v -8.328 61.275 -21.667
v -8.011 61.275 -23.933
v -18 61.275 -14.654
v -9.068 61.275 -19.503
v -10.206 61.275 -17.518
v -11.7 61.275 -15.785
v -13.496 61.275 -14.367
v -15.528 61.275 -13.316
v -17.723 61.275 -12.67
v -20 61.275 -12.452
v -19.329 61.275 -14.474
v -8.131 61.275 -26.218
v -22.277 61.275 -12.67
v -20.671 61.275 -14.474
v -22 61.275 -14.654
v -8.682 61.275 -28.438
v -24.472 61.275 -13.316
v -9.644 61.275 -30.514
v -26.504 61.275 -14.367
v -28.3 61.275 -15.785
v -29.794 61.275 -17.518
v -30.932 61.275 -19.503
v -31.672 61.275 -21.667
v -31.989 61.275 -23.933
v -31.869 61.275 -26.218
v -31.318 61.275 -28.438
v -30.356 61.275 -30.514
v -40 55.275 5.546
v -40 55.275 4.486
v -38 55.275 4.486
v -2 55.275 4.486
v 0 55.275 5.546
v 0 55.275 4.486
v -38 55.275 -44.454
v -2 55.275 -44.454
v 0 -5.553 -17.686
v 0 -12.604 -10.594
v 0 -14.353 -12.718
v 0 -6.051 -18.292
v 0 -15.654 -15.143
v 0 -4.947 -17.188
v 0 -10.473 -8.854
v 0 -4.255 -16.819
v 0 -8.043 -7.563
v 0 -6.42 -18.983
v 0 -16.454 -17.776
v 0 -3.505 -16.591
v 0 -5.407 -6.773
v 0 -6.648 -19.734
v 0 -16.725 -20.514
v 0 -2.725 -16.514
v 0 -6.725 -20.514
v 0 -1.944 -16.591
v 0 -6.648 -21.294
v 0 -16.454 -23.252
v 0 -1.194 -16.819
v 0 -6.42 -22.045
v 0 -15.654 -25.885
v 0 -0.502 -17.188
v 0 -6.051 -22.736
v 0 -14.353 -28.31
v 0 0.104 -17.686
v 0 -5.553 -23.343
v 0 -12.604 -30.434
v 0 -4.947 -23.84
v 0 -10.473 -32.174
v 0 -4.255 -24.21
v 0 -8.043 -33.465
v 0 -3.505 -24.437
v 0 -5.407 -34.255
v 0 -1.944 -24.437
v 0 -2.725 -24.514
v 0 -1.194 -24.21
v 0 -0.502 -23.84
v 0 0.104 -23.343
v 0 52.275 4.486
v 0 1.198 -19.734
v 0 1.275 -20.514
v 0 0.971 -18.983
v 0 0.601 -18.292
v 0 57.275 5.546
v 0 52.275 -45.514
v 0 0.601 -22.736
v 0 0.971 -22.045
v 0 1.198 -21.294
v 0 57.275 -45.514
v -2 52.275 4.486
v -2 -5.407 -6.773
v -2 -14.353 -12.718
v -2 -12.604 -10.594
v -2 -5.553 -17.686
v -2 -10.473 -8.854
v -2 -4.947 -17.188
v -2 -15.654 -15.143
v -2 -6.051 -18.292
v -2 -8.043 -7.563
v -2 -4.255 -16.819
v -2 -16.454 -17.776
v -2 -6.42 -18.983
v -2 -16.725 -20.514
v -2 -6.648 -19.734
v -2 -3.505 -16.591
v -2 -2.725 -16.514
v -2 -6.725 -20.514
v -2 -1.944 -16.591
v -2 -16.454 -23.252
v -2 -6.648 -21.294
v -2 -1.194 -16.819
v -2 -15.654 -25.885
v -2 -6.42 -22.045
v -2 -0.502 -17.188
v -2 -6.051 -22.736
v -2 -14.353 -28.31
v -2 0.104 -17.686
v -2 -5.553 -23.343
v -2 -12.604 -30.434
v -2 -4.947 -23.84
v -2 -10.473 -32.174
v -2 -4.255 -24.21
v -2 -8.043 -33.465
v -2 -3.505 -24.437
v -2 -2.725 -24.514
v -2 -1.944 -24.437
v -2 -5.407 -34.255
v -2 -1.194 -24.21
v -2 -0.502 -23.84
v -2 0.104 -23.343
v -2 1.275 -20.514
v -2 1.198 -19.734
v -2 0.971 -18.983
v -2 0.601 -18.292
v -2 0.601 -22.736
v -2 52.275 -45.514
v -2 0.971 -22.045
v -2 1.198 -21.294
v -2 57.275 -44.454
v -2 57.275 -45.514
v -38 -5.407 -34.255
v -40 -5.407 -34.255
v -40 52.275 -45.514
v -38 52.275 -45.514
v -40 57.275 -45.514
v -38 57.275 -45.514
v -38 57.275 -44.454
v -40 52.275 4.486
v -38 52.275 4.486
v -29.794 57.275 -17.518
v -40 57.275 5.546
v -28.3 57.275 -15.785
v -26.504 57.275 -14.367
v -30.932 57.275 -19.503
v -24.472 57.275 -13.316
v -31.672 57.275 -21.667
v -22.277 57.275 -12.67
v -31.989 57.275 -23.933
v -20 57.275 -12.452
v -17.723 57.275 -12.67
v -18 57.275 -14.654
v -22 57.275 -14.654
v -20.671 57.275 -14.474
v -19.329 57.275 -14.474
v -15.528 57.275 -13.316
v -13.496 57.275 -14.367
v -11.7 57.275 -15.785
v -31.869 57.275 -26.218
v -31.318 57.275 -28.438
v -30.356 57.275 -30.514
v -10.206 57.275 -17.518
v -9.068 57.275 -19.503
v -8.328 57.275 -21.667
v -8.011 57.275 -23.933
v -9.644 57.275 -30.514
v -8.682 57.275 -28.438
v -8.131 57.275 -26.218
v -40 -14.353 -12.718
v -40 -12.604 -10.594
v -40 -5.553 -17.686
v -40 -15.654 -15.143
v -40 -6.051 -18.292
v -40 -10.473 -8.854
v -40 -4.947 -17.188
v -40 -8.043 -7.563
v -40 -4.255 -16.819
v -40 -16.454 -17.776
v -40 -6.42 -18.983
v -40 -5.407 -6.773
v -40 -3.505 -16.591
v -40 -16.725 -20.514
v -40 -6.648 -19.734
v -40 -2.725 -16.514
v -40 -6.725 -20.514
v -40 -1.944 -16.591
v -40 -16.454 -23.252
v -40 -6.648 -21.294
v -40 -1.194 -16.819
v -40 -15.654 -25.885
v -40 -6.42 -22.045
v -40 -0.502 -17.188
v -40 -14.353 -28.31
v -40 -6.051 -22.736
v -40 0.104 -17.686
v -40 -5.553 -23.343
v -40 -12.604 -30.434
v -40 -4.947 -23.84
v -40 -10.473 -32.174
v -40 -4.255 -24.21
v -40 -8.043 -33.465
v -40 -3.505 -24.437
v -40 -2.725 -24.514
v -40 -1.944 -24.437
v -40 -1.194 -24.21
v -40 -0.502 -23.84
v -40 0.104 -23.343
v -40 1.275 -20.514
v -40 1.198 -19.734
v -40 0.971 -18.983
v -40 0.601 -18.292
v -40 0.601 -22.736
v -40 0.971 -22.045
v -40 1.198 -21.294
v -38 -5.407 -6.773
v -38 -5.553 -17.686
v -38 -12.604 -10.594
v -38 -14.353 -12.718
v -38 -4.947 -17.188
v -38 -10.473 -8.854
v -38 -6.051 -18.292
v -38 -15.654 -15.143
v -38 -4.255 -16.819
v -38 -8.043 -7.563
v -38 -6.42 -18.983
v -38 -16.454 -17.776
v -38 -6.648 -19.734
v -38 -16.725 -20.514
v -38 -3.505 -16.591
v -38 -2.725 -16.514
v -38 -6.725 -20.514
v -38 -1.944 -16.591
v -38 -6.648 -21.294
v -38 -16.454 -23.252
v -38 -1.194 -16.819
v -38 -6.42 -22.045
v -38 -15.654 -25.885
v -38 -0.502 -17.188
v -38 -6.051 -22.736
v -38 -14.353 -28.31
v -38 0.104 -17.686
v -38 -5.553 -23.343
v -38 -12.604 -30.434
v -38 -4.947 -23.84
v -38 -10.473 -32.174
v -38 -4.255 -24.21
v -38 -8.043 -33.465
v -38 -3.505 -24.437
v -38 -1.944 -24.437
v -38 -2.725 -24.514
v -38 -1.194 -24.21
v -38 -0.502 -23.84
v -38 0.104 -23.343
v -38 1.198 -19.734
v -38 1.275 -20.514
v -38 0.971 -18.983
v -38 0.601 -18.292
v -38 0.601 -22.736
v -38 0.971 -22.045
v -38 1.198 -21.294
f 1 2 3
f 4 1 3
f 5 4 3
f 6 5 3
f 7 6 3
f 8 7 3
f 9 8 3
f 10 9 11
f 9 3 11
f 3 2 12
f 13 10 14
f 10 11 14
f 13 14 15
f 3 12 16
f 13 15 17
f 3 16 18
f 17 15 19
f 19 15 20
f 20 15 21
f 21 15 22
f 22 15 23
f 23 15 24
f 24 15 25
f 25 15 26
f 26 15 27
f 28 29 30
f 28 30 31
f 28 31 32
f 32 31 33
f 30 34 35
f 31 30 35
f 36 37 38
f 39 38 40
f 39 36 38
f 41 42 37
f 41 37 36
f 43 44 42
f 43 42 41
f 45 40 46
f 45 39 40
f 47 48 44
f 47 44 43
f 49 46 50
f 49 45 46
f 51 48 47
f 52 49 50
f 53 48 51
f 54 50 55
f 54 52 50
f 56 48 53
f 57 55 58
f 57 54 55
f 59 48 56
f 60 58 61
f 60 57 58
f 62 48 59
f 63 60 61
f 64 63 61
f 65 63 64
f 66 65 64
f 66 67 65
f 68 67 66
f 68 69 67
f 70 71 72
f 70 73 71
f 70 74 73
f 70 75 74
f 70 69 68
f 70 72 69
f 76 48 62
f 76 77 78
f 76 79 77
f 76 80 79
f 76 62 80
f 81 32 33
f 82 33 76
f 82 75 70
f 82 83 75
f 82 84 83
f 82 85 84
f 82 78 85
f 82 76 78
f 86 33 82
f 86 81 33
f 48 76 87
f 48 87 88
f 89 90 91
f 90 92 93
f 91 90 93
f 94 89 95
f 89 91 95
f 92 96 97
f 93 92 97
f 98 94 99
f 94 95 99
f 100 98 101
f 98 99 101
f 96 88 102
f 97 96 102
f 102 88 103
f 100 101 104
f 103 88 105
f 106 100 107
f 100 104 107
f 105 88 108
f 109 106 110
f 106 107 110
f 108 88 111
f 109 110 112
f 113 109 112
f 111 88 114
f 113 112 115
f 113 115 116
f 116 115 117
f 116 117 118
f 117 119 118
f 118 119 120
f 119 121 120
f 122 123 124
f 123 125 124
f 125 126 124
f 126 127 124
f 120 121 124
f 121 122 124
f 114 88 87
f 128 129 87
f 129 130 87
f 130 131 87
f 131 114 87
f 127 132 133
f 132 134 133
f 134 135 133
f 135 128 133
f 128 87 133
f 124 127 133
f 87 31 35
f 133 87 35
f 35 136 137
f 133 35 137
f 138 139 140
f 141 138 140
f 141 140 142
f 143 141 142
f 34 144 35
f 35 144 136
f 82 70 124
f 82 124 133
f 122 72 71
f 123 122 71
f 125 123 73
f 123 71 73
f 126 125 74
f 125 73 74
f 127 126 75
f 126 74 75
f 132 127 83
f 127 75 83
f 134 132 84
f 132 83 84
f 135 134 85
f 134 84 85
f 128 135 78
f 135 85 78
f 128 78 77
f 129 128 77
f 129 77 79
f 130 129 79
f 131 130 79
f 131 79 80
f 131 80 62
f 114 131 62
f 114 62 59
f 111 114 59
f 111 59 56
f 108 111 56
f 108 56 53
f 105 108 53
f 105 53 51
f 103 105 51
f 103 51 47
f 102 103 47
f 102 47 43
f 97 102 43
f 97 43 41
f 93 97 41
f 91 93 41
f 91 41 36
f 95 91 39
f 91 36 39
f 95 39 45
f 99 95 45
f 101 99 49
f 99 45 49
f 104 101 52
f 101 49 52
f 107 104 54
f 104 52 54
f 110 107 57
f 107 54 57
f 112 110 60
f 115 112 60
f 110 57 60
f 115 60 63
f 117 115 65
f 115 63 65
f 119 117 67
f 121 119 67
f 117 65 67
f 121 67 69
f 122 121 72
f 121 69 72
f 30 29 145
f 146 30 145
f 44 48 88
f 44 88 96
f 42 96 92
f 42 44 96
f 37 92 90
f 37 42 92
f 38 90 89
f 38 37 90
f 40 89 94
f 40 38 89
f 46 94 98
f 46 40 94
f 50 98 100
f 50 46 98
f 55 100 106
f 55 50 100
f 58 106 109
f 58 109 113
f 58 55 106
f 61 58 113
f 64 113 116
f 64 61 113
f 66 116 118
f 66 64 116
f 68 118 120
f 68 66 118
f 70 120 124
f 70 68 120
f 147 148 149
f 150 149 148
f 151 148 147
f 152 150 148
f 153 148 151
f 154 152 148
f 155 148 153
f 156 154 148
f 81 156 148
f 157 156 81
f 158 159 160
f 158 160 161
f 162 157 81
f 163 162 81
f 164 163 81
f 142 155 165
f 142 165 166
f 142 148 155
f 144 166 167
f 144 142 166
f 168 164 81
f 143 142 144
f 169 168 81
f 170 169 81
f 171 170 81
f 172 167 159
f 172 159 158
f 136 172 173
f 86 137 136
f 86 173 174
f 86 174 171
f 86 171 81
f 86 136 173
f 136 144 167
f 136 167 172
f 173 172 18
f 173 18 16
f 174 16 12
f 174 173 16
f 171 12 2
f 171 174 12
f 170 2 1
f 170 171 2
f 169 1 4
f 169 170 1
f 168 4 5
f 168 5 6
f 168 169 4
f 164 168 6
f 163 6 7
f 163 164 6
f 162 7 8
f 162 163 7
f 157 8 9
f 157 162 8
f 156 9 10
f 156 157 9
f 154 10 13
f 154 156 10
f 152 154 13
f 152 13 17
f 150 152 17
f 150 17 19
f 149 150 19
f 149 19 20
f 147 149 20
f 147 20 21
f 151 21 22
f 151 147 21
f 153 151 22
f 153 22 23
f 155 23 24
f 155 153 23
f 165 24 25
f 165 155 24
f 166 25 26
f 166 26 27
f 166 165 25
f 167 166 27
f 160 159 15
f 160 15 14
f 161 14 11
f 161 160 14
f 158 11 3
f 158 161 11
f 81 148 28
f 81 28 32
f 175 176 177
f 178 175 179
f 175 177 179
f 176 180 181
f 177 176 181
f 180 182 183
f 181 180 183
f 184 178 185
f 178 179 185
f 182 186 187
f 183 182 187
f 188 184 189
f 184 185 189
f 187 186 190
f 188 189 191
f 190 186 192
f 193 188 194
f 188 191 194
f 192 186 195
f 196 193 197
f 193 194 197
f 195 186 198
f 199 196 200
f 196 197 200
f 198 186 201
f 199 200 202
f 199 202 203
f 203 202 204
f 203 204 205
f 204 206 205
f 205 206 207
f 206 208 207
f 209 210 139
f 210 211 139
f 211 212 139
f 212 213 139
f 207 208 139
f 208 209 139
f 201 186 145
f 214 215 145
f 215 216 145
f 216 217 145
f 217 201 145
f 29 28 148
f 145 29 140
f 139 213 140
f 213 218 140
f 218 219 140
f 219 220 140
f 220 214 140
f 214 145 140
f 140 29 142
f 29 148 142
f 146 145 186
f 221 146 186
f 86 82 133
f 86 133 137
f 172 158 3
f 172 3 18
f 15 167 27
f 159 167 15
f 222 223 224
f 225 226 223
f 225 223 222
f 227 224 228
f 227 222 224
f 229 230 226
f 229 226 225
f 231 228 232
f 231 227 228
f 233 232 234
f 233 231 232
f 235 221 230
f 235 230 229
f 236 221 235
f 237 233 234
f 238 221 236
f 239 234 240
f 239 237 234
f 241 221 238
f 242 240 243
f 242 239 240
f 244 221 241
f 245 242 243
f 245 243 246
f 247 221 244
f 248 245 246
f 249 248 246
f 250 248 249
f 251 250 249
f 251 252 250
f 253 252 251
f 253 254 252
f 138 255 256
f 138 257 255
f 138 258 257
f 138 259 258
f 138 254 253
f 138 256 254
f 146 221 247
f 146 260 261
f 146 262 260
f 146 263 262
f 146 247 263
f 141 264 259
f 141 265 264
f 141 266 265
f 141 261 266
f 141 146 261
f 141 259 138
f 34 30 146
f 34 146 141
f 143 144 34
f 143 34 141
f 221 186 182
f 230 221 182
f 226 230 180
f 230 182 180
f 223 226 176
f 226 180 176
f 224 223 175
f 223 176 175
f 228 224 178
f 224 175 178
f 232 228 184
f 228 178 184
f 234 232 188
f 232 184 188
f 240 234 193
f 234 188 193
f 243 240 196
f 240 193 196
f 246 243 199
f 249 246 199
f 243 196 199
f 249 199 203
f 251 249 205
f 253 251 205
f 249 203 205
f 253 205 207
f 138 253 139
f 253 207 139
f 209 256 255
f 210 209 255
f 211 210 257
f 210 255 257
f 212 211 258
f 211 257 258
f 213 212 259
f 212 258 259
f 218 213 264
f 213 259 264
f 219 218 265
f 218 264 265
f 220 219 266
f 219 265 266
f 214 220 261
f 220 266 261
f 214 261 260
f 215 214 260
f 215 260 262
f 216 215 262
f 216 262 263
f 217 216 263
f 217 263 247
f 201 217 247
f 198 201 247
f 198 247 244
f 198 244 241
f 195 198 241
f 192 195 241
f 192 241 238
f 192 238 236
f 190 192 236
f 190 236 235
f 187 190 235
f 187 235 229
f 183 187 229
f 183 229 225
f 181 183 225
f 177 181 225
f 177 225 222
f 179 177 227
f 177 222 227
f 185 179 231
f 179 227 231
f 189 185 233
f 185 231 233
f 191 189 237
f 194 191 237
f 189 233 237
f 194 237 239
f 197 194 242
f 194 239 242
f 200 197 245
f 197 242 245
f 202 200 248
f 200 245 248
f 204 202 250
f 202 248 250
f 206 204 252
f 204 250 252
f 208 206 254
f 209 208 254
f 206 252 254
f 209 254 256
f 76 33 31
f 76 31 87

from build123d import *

# Parameters (mm, degrees)
BOSS_EXTRUDE1_DEPTH = 2
SKETCH2_W           = 40
SKETCH2_H           = 50
BOSS_EXTRUDE2_DEPTH = 2
BOSS_EXTRUDE3_DEPTH = 4
SKETCH4_R           = 4
CUT_EXTRUDE1_DEPTH  = 41


with BuildPart() as part:
    # Sketch1 → Boss-Extrude1 (new body)
    with BuildSketch(Plane(origin=(0, 0, 0), x_dir=(0, 0, -1), z_dir=(1, 0, 0))):
        with BuildLine():
            Line((-4.485924614, 52.27530577), (6.773398514, -5.406820081))
            ThreePointArc((6.773398514, -5.406820081), (20.514075386, -16.72469423), (34.254752259, -5.406820081))
            Line((34.254752259, -5.406820081), (45.514075386, 52.27530577))
            Line((45.514075386, 52.27530577), (45.514075386, 57.27530577))
            Line((45.514075386, 57.27530577), (-4.485924614, 57.27530577))
            Line((-4.485924614, 57.27530577), (-4.485924614, 52.27530577))
        make_face()
    extrude(amount=-BOSS_EXTRUDE1_DEPTH)


with BuildPart() as body_2:
    # Mirror1: mirrored copy
    add(part.part.mirror(Plane(origin=(-20, 0, 0), x_dir=(0, 0, 1), z_dir=(1, 0, 0))))


with BuildPart() as part_1:
    add(part.part)

    add(body_2.part)  # Boss-Extrude2 merges body 2
    # Sketch2 → Boss-Extrude2 (add)
    with BuildSketch(Plane(origin=(0, 57.27530577, 0), x_dir=(1, 0, 0), z_dir=(0, 1, 0))):
        with Locations((-20, 19.454333817)):
            Rectangle(SKETCH2_W, SKETCH2_H)
    extrude(amount=-BOSS_EXTRUDE2_DEPTH)

    # Sketch3 → Boss-Extrude3 (add)
    with BuildSketch(Plane(origin=(0, 57.27530577, 0), x_dir=(1, 0, 0), z_dir=(0, 1, 0))):
        with BuildLine():
            Line((-18, 14.653938589), (-9.643842411, 30.514075386))
            ThreePointArc((-9.643842411, 30.514075386), (-20, 12.45189756), (-30.356157589, 30.514075386))
            Line((-30.356157589, 30.514075386), (-22, 14.653938589))
            ThreePointArc((-22, 14.653938589), (-20, 14.45189756), (-18, 14.653938589))
        make_face()
    extrude(amount=BOSS_EXTRUDE3_DEPTH)

    # Sketch4 → Cut-Extrude1 (cut, through all)
    with BuildSketch(Plane(origin=(0, 0, 0), x_dir=(0, 0, -1), z_dir=(1, 0, 0))):
        with Locations((20.514075386, -2.72469423)):
            Circle(SKETCH4_R)
    extrude(amount=-CUT_EXTRUDE1_DEPTH, mode=Mode.SUBTRACT)


solid = part_1.part
